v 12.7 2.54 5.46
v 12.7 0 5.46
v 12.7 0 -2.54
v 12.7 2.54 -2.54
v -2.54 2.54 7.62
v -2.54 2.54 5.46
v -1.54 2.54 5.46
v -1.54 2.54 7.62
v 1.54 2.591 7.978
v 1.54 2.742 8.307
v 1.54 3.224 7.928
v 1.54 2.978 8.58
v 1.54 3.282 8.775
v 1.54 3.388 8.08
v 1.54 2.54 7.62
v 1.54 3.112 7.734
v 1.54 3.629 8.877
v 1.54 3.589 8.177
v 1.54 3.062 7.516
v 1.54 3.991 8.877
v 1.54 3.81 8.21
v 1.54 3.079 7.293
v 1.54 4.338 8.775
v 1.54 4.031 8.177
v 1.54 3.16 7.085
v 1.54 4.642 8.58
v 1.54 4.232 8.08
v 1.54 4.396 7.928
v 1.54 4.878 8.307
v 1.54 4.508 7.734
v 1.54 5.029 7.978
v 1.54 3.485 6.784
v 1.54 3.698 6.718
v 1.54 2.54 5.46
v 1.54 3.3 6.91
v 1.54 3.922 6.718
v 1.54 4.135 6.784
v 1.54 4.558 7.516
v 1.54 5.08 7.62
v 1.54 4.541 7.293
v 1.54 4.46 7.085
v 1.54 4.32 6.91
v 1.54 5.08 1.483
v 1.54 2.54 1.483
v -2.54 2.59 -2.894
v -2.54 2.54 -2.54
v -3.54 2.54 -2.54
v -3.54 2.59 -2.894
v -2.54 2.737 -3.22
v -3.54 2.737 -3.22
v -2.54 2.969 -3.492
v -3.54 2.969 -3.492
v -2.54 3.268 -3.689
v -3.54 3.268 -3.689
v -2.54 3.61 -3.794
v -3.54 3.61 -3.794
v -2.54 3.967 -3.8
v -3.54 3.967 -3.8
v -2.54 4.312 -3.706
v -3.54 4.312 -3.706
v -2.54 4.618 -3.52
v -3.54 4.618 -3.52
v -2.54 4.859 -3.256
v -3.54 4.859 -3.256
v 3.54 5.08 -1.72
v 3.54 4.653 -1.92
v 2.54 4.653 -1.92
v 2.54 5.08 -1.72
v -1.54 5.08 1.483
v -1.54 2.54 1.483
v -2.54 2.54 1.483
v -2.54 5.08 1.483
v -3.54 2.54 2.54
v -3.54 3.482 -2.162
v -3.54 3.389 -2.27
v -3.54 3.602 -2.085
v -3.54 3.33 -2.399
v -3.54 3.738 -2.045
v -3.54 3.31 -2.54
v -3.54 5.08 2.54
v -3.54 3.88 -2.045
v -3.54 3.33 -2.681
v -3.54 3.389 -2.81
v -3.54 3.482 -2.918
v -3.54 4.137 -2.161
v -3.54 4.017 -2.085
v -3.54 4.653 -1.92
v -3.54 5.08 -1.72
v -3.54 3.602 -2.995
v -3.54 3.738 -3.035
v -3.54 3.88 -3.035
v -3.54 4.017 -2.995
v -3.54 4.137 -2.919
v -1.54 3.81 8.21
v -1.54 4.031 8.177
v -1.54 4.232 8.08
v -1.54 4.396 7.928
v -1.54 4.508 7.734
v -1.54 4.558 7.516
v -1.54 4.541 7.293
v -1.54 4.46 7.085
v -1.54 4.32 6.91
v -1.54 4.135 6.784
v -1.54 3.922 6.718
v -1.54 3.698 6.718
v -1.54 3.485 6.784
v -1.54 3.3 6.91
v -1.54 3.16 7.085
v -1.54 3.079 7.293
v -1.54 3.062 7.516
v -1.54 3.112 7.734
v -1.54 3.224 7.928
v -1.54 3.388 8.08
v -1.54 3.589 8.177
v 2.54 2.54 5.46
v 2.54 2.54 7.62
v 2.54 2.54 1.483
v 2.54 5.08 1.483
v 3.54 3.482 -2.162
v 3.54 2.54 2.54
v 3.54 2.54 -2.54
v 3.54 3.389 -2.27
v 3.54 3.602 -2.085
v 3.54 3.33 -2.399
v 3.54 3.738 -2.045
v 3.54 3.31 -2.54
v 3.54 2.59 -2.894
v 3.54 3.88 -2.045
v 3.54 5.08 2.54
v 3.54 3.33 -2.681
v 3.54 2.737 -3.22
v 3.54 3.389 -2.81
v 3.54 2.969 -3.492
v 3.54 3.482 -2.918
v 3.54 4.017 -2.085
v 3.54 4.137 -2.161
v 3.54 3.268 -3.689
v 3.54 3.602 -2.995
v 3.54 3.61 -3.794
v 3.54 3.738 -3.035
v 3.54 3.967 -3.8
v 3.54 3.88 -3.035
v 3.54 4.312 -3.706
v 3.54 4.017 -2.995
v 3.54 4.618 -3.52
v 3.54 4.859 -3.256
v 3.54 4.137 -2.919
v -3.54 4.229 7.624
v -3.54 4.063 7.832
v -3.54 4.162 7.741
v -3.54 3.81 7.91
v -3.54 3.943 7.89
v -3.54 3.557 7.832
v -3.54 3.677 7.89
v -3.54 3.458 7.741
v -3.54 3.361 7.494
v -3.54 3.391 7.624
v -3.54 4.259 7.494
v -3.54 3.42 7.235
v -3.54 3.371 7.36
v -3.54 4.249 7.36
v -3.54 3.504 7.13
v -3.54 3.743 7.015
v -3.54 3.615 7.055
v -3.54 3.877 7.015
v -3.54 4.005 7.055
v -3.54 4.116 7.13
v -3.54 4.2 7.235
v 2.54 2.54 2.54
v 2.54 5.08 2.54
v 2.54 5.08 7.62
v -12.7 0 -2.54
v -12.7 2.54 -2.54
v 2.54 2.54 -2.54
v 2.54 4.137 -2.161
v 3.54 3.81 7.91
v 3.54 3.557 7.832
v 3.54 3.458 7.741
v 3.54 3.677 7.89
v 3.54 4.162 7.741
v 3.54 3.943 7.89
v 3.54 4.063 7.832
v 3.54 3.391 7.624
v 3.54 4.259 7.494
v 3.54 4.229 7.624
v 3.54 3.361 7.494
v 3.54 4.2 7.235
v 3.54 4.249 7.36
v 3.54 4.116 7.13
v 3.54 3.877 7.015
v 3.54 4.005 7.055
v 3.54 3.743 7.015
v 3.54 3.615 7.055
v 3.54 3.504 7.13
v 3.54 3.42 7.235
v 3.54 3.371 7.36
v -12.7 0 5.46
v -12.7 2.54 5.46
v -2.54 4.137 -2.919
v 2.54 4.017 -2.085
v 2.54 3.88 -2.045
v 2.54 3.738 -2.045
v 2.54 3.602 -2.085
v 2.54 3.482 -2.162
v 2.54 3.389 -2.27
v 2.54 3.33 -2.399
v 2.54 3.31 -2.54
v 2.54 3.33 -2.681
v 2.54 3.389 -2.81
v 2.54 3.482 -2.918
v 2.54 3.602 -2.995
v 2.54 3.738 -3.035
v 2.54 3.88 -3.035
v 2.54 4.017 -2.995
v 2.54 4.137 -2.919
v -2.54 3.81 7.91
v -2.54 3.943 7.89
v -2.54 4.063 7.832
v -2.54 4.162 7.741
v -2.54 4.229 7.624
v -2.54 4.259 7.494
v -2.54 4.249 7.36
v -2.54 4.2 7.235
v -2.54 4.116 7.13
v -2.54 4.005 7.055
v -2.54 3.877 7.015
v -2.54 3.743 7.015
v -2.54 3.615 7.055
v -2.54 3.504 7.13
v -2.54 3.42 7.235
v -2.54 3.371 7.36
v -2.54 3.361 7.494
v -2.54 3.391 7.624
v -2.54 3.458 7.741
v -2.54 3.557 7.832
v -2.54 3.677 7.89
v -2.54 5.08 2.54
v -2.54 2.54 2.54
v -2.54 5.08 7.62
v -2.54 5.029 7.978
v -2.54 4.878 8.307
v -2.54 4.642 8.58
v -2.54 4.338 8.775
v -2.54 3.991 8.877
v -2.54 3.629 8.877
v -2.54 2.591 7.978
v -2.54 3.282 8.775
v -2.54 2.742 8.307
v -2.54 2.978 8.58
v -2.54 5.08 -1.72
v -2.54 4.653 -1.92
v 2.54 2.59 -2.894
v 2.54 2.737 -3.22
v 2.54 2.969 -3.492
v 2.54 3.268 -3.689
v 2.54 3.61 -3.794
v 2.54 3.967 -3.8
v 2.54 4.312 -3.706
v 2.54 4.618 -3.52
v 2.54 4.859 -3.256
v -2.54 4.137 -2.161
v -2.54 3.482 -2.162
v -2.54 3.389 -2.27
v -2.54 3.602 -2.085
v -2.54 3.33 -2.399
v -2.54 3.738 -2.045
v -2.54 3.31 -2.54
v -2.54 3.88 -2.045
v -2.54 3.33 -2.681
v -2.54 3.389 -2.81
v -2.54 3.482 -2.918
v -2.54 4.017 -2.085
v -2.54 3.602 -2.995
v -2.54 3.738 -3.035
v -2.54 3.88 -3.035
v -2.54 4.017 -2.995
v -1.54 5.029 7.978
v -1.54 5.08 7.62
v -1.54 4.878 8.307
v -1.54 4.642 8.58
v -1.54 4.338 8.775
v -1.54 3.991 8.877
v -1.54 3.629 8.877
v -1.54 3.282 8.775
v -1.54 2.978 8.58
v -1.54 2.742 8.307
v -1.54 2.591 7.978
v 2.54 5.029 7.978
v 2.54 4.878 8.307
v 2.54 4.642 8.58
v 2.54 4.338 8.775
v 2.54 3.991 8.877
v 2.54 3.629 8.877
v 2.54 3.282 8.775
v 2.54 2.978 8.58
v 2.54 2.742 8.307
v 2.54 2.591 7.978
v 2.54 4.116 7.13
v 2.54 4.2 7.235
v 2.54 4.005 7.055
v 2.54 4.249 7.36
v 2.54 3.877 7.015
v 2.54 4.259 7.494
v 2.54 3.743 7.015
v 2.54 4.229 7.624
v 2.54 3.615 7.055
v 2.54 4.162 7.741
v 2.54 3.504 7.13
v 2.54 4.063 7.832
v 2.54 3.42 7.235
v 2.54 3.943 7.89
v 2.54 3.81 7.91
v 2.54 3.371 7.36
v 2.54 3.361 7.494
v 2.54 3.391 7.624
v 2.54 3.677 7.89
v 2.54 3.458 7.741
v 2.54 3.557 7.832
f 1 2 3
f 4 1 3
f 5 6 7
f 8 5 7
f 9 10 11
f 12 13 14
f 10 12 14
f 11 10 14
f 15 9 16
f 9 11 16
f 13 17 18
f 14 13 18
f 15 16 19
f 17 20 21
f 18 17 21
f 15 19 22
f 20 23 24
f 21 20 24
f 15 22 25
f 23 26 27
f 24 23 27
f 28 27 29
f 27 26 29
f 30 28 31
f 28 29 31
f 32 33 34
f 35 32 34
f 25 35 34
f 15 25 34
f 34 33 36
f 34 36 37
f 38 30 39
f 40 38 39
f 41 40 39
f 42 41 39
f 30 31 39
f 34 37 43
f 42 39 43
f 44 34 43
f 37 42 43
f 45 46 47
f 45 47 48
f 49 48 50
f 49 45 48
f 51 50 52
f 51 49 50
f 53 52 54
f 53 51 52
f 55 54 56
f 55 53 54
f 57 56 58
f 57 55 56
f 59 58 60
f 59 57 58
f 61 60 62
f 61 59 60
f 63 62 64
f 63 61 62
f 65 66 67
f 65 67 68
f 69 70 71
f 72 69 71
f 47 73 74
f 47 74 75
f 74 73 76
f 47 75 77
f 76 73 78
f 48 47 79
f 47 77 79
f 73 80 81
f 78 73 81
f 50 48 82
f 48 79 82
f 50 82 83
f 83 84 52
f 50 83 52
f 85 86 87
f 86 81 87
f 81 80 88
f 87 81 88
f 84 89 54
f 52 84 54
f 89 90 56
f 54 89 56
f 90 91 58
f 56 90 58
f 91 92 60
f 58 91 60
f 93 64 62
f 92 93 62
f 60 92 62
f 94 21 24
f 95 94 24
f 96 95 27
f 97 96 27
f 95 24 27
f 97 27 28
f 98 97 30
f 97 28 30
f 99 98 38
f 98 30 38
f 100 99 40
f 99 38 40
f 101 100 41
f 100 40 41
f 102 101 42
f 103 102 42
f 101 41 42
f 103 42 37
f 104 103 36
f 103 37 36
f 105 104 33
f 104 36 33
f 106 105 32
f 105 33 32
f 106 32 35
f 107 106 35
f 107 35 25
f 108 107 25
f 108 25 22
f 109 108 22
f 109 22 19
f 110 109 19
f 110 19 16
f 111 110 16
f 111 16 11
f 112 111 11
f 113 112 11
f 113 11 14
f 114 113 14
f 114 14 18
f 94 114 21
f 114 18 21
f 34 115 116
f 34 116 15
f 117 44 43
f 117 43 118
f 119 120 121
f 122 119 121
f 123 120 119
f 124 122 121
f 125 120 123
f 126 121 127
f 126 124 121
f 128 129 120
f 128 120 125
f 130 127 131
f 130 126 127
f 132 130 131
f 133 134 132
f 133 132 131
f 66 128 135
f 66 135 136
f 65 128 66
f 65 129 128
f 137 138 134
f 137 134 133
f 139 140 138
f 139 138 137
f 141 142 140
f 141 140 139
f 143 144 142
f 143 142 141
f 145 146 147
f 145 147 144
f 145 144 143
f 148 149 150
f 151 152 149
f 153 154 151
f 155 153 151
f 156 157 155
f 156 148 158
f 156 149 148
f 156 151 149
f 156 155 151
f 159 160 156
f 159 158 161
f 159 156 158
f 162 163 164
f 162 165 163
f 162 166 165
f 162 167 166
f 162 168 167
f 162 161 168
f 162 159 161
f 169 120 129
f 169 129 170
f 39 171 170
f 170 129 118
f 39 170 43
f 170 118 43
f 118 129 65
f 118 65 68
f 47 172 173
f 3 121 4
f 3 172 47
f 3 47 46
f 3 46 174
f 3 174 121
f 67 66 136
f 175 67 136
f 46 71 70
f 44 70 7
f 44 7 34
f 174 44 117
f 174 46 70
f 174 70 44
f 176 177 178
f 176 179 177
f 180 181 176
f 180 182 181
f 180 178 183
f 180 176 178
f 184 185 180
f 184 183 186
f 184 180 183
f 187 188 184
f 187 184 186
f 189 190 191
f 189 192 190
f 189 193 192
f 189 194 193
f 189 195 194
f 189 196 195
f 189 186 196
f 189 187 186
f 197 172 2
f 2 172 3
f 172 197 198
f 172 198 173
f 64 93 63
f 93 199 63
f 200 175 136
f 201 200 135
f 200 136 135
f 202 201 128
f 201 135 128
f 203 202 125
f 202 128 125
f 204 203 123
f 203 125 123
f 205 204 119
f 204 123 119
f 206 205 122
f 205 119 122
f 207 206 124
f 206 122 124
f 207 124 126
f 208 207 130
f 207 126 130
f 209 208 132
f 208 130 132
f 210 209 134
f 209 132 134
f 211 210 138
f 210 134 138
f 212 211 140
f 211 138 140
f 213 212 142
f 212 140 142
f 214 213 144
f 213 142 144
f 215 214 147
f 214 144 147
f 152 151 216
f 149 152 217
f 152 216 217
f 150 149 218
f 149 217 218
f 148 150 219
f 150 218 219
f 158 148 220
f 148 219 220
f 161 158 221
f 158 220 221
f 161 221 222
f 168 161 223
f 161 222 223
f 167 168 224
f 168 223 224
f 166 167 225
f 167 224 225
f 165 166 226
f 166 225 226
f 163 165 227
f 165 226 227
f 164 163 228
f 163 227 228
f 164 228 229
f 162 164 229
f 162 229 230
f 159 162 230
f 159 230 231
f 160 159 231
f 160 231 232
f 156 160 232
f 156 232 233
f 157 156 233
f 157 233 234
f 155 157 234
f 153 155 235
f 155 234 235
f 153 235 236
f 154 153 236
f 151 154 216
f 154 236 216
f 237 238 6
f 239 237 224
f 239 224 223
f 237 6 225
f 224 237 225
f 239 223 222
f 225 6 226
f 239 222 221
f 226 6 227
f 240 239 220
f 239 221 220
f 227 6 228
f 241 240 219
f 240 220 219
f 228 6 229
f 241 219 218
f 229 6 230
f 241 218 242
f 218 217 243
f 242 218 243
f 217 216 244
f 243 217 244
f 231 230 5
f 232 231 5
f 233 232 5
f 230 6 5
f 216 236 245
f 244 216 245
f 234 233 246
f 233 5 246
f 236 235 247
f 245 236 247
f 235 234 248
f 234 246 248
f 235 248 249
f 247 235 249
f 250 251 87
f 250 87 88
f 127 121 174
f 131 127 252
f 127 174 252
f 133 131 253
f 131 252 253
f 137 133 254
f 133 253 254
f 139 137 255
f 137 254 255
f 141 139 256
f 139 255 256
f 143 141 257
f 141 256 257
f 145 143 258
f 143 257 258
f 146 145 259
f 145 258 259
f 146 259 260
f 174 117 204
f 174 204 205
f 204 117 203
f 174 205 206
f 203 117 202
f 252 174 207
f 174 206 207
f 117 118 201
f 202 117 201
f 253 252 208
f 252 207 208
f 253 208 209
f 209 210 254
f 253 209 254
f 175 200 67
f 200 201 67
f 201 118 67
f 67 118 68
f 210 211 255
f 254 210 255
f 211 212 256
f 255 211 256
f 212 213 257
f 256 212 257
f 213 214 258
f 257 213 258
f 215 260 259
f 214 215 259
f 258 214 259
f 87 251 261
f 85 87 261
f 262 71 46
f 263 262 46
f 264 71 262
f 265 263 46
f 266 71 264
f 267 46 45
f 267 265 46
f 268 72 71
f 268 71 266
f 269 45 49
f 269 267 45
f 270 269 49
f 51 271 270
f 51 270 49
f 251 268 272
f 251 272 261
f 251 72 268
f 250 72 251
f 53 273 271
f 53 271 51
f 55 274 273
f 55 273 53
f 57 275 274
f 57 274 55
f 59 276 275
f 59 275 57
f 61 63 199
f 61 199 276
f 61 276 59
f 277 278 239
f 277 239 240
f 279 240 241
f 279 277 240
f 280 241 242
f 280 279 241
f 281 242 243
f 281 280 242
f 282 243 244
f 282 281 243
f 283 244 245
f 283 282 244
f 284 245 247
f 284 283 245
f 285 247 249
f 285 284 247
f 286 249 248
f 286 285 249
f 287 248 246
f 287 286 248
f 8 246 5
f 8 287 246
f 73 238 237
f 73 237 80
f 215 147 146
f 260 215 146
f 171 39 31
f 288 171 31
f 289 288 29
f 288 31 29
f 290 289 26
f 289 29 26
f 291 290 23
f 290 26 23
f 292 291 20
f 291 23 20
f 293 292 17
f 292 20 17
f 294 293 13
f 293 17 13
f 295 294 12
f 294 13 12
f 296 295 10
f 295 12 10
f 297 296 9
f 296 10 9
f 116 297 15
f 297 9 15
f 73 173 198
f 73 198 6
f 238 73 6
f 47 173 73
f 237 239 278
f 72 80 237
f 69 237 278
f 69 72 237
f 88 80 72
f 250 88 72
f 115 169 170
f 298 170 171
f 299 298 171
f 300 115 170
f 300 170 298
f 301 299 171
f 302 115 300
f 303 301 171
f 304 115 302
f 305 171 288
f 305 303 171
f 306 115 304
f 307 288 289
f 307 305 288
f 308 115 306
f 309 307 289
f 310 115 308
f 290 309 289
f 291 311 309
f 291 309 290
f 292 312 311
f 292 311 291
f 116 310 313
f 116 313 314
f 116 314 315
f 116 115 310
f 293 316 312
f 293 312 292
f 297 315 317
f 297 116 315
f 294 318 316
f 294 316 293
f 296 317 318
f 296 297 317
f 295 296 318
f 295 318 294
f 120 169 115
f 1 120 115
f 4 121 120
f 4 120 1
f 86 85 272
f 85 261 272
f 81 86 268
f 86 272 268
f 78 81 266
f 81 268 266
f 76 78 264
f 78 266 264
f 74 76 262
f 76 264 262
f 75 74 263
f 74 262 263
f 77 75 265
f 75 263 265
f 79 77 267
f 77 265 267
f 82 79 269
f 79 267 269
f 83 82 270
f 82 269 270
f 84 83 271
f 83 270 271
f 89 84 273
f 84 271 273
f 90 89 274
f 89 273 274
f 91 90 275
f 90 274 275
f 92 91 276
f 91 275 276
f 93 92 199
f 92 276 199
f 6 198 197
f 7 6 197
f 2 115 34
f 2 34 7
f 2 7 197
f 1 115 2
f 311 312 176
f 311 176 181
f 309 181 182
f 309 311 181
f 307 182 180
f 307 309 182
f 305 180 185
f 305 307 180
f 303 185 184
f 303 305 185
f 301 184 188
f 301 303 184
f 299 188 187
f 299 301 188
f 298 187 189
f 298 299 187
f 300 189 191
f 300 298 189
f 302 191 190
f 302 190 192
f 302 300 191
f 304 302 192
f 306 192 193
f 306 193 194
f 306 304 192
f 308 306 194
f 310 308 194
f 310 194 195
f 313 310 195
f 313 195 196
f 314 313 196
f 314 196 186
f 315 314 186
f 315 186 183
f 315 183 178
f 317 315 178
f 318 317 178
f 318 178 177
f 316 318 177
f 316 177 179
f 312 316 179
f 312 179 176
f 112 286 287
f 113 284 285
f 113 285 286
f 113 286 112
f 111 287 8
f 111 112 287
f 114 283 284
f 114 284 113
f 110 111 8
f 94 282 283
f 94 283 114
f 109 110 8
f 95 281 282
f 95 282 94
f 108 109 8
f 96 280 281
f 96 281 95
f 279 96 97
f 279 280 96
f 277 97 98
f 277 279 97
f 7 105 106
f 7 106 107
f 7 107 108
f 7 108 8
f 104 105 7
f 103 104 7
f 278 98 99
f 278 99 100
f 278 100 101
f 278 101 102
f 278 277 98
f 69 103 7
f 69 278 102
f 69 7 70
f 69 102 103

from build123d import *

# Parameters (mm, degrees)
SKETCH1_W                        = 25.4
SKETCH1_H                        = 5.08
BOSS_EXTRUDE1_DEPTH              = 2.54
BOSS_EXTRUDE5_DEPTH              = 2.54
SKETCH6_R                        = 1.27
BOSS_EXTRUDE6_DEPTH              = 1
BOSS_EXTRUDE7_DEPTH              = 1
SKETCH8_W                        = 25.4
SKETCH8_H                        = 8
BOSS_EXTRUDE8_DEPTH              = 2.54
SKETCH11_R                       = 0.5
CUT_EXTRUDE1_DEPTH               = 17.24
CUT_EXTRUDE2_DEPTH               = 10.54
SKETCH2_W                        = 1
SKETCH2_H                        = 4.46
BOSS_EXTRUDE2_DEPTH              = 2.54
SKETCH13_R                       = 0.75
BOSS_EXTRUDE12_DEPTH             = 3.08
CUT_EXTRUDE3_DEPTH               = 9
BOSS_EXTRUDE13_REACH             = 12.16
SKETCH16_R                       = 0.45
BOSS_EXTRUDE13_DIRECTION_2_REACH = 17.24


with BuildPart() as part:
    # Sketch1 → Boss-Extrude1 (new body)
    with BuildSketch(Plane(origin=(0, 0, 0), x_dir=(1, 0, 0), z_dir=(0, 1, 0))):
        Rectangle(SKETCH1_W, SKETCH1_H)
    extrude(amount=BOSS_EXTRUDE1_DEPTH)

    # Sketch5 → Boss-Extrude5 (add)
    with BuildSketch(Plane(origin=(0, 2.54, 0), x_dir=(1, 0, 0), z_dir=(0, 1, 0))):
        Polygon((-3.54, 2.54), (-3.54, -2.54), (-2.54, -2.54), (-2.54, -7.62), (-1.54, -7.62), (-1.54, -1.482742514), (-2.54, -1.482742514), (-2.54, 2.54), align=None)
    boss_extrude5 = extrude(amount=BOSS_EXTRUDE5_DEPTH)

    # Sketch6 → Boss-Extrude6 (add)
    with BuildSketch(Plane(origin=(-1.54, 0, 0), x_dir=(0, 0, -1), z_dir=(1, 0, 0))):
        with Locations((-7.62, 3.81)):
            Circle(SKETCH6_R)
    boss_extrude6 = extrude(amount=-BOSS_EXTRUDE6_DEPTH)

    # Sketch7 → Boss-Extrude7 (add)
    with BuildSketch(Plane(origin=(-2.54, 0, 0), x_dir=(0, 0, -1), z_dir=(1, 0, 0))):
        with BuildLine():
            Line((2.54, 5.08), (2.54, 2.54))
            ThreePointArc((2.54, 2.54), (3.81, 3.81), (2.54, 5.08))
        make_face()
    boss_extrude7 = extrude(amount=-BOSS_EXTRUDE7_DEPTH)

    # Mirror1: Boss-Extrude5, Boss-Extrude6, Boss-Extrude7 across plane
    add(boss_extrude5.mirror(Plane(origin=(0, 0, 0), x_dir=(0, 0, 1), z_dir=(1, 0, 0))))
    add(boss_extrude6.mirror(Plane(origin=(0, 0, 0), x_dir=(0, 0, 1), z_dir=(1, 0, 0))))
    add(boss_extrude7.mirror(Plane(origin=(0, 0, 0), x_dir=(0, 0, 1), z_dir=(1, 0, 0))))

    # Sketch8 → Boss-Extrude8 (add)
    with BuildSketch(Plane.XZ.offset(-2.54)):
        with Locations((0, 1.46)):
            Rectangle(SKETCH8_W, SKETCH8_H)
    extrude(amount=BOSS_EXTRUDE8_DEPTH)

    # Sketch11 → Cut-Extrude1 (cut, through all)
    with BuildSketch(Plane(origin=(3.54, 0, 0), x_dir=(0, 0, -1), z_dir=(1, 0, 0))):
        with Locations((2.54, 3.81)):
            Circle(SKETCH11_R)
    extrude(amount=-CUT_EXTRUDE1_DEPTH, mode=Mode.SUBTRACT)

    # Sketch12 → Cut-Extrude2 (cut)
    with BuildSketch(Plane(origin=(3.54, 0, 0), x_dir=(0, 0, -1), z_dir=(1, 0, 0))):
        with BuildLine():
            Line((1.923817285, 5.08), (1.72030075, 5.08))
            Line((1.72030075, 5.08), (2.177926741, 4.101139391))
            ThreePointArc((2.177926741, 4.101139391), (2.54, 3.34539351), (2.902073259, 4.101139391))
            Line((2.902073259, 4.101139391), (3.256261376, 4.8587467))
            ThreePointArc((3.256261376, 4.8587467), (2.914827754, 5.023426617), (2.54, 5.08))
            Line((2.54, 5.08), (1.923817285, 5.08))
        make_face()
    extrude(amount=-CUT_EXTRUDE2_DEPTH, mode=Mode.SUBTRACT)

    # Sketch2 → Boss-Extrude2 (add)
    with BuildSketch(Plane(origin=(0, 2.54, 0), x_dir=(1, 0, 0), z_dir=(0, 1, 0))):
        with Locations((-3.04, -0.31)):
            Rectangle(SKETCH2_W, SKETCH2_H)
        with Locations((3.04, -0.31)):
            Rectangle(SKETCH2_W, SKETCH2_H)
    extrude(amount=BOSS_EXTRUDE2_DEPTH)

    # Sketch13 → Boss-Extrude12 (add)
    with BuildSketch(Plane.ZY.offset(-1.54)):
        with Locations((7.46, 3.81)):
            Circle(SKETCH13_R)
    extrude(amount=BOSS_EXTRUDE12_DEPTH)

    # Sketch14 → Cut-Extrude3 (cut)
    with BuildSketch(Plane(origin=(3.54, 0, 0), x_dir=(0, 0, -1), z_dir=(1, 0, 0))):
        Polygon((1.92, 4.652843909), (1.72030075, 5.08), (1.92, 5.08), align=None)
    extrude(amount=-CUT_EXTRUDE3_DEPTH, mode=Mode.SUBTRACT)

    # Boss-Extrude13: up to this face of the body (flat: up to its plane)
    boss_extrude13_end = Plane(part.part.faces().sort_by_distance((-3.54, 3.747341049, -0.245716728))[0])
    # Sketch16 → Boss-Extrude13 (add, up to the picked face)
    with BuildSketch(Plane.ZY.offset(2.54), mode=Mode.PRIVATE) as boss_extrude13_sk1:
        with Locations((7.46, 3.81)):
            Circle(SKETCH16_R)
    boss_extrude13_tool1 = split(extrude(boss_extrude13_sk1.sketch, amount=BOSS_EXTRUDE13_REACH, mode=Mode.PRIVATE), bisect_by=boss_extrude13_end, keep=Keep.BOTH, mode=Mode.PRIVATE)
    add(boss_extrude13_tool1.solids().sort_by_distance((-2.54, 3.81, 7.46))[0])

    # Boss-Extrude13 direction 2: up to this face of the body (flat: up to its plane)
    boss_extrude13_direction_2_end = Plane(part.part.faces().sort_by_distance((3.54, 3.747341049, -0.245716728))[0])
    # Sketch16 → Boss-Extrude13 direction 2 (add, up to the picked face)
    with BuildSketch(Plane.ZY.offset(2.54), mode=Mode.PRIVATE) as boss_extrude13_direction_2_sk1:
        with Locations((7.46, 3.81)):
            Circle(SKETCH16_R)
    boss_extrude13_direction_2_tool1 = split(extrude(boss_extrude13_direction_2_sk1.sketch, amount=-BOSS_EXTRUDE13_DIRECTION_2_REACH, mode=Mode.PRIVATE), bisect_by=boss_extrude13_direction_2_end, keep=Keep.BOTH, mode=Mode.PRIVATE)
    add(boss_extrude13_direction_2_tool1.solids().sort_by_distance((-2.54, 3.81, 7.46))[0])


solid = part.part
